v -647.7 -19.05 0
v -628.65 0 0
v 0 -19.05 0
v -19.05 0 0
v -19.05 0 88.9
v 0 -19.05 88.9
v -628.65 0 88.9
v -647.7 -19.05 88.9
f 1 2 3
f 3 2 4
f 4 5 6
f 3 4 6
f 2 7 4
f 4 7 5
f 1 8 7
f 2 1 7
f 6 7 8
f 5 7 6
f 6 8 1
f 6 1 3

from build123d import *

# Parameters (mm, degrees)
F0_W     = 647.7
F0_H     = 88.9
F1_DEPTH = 19.05
F3_DEPTH = 127
F5_DEPTH = 127


with BuildPart() as f1:
    # F0 (on Front) → F1 (new body)
    with BuildSketch(Plane.XZ):
        with Locations((-323.85, 44.45)):
            Rectangle(F0_W, F0_H)
    extrude(amount=F1_DEPTH)

    # F2 (on face) → F3 (cut)
    with BuildSketch(Plane.XY.offset(88.9)):
        Polygon((-647.7, 0), (-647.7, -19.05), (-628.65, 0), align=None)
    extrude(amount=-F3_DEPTH, mode=Mode.SUBTRACT)

    # F4 (on face) → F5 (cut)
    with BuildSketch(Plane.XY.offset(88.9)):
        Polygon((-19.05, 0), (0, -19.05), (0, 0), align=None)
    extrude(amount=-F5_DEPTH, mode=Mode.SUBTRACT)


solid = f1.part
